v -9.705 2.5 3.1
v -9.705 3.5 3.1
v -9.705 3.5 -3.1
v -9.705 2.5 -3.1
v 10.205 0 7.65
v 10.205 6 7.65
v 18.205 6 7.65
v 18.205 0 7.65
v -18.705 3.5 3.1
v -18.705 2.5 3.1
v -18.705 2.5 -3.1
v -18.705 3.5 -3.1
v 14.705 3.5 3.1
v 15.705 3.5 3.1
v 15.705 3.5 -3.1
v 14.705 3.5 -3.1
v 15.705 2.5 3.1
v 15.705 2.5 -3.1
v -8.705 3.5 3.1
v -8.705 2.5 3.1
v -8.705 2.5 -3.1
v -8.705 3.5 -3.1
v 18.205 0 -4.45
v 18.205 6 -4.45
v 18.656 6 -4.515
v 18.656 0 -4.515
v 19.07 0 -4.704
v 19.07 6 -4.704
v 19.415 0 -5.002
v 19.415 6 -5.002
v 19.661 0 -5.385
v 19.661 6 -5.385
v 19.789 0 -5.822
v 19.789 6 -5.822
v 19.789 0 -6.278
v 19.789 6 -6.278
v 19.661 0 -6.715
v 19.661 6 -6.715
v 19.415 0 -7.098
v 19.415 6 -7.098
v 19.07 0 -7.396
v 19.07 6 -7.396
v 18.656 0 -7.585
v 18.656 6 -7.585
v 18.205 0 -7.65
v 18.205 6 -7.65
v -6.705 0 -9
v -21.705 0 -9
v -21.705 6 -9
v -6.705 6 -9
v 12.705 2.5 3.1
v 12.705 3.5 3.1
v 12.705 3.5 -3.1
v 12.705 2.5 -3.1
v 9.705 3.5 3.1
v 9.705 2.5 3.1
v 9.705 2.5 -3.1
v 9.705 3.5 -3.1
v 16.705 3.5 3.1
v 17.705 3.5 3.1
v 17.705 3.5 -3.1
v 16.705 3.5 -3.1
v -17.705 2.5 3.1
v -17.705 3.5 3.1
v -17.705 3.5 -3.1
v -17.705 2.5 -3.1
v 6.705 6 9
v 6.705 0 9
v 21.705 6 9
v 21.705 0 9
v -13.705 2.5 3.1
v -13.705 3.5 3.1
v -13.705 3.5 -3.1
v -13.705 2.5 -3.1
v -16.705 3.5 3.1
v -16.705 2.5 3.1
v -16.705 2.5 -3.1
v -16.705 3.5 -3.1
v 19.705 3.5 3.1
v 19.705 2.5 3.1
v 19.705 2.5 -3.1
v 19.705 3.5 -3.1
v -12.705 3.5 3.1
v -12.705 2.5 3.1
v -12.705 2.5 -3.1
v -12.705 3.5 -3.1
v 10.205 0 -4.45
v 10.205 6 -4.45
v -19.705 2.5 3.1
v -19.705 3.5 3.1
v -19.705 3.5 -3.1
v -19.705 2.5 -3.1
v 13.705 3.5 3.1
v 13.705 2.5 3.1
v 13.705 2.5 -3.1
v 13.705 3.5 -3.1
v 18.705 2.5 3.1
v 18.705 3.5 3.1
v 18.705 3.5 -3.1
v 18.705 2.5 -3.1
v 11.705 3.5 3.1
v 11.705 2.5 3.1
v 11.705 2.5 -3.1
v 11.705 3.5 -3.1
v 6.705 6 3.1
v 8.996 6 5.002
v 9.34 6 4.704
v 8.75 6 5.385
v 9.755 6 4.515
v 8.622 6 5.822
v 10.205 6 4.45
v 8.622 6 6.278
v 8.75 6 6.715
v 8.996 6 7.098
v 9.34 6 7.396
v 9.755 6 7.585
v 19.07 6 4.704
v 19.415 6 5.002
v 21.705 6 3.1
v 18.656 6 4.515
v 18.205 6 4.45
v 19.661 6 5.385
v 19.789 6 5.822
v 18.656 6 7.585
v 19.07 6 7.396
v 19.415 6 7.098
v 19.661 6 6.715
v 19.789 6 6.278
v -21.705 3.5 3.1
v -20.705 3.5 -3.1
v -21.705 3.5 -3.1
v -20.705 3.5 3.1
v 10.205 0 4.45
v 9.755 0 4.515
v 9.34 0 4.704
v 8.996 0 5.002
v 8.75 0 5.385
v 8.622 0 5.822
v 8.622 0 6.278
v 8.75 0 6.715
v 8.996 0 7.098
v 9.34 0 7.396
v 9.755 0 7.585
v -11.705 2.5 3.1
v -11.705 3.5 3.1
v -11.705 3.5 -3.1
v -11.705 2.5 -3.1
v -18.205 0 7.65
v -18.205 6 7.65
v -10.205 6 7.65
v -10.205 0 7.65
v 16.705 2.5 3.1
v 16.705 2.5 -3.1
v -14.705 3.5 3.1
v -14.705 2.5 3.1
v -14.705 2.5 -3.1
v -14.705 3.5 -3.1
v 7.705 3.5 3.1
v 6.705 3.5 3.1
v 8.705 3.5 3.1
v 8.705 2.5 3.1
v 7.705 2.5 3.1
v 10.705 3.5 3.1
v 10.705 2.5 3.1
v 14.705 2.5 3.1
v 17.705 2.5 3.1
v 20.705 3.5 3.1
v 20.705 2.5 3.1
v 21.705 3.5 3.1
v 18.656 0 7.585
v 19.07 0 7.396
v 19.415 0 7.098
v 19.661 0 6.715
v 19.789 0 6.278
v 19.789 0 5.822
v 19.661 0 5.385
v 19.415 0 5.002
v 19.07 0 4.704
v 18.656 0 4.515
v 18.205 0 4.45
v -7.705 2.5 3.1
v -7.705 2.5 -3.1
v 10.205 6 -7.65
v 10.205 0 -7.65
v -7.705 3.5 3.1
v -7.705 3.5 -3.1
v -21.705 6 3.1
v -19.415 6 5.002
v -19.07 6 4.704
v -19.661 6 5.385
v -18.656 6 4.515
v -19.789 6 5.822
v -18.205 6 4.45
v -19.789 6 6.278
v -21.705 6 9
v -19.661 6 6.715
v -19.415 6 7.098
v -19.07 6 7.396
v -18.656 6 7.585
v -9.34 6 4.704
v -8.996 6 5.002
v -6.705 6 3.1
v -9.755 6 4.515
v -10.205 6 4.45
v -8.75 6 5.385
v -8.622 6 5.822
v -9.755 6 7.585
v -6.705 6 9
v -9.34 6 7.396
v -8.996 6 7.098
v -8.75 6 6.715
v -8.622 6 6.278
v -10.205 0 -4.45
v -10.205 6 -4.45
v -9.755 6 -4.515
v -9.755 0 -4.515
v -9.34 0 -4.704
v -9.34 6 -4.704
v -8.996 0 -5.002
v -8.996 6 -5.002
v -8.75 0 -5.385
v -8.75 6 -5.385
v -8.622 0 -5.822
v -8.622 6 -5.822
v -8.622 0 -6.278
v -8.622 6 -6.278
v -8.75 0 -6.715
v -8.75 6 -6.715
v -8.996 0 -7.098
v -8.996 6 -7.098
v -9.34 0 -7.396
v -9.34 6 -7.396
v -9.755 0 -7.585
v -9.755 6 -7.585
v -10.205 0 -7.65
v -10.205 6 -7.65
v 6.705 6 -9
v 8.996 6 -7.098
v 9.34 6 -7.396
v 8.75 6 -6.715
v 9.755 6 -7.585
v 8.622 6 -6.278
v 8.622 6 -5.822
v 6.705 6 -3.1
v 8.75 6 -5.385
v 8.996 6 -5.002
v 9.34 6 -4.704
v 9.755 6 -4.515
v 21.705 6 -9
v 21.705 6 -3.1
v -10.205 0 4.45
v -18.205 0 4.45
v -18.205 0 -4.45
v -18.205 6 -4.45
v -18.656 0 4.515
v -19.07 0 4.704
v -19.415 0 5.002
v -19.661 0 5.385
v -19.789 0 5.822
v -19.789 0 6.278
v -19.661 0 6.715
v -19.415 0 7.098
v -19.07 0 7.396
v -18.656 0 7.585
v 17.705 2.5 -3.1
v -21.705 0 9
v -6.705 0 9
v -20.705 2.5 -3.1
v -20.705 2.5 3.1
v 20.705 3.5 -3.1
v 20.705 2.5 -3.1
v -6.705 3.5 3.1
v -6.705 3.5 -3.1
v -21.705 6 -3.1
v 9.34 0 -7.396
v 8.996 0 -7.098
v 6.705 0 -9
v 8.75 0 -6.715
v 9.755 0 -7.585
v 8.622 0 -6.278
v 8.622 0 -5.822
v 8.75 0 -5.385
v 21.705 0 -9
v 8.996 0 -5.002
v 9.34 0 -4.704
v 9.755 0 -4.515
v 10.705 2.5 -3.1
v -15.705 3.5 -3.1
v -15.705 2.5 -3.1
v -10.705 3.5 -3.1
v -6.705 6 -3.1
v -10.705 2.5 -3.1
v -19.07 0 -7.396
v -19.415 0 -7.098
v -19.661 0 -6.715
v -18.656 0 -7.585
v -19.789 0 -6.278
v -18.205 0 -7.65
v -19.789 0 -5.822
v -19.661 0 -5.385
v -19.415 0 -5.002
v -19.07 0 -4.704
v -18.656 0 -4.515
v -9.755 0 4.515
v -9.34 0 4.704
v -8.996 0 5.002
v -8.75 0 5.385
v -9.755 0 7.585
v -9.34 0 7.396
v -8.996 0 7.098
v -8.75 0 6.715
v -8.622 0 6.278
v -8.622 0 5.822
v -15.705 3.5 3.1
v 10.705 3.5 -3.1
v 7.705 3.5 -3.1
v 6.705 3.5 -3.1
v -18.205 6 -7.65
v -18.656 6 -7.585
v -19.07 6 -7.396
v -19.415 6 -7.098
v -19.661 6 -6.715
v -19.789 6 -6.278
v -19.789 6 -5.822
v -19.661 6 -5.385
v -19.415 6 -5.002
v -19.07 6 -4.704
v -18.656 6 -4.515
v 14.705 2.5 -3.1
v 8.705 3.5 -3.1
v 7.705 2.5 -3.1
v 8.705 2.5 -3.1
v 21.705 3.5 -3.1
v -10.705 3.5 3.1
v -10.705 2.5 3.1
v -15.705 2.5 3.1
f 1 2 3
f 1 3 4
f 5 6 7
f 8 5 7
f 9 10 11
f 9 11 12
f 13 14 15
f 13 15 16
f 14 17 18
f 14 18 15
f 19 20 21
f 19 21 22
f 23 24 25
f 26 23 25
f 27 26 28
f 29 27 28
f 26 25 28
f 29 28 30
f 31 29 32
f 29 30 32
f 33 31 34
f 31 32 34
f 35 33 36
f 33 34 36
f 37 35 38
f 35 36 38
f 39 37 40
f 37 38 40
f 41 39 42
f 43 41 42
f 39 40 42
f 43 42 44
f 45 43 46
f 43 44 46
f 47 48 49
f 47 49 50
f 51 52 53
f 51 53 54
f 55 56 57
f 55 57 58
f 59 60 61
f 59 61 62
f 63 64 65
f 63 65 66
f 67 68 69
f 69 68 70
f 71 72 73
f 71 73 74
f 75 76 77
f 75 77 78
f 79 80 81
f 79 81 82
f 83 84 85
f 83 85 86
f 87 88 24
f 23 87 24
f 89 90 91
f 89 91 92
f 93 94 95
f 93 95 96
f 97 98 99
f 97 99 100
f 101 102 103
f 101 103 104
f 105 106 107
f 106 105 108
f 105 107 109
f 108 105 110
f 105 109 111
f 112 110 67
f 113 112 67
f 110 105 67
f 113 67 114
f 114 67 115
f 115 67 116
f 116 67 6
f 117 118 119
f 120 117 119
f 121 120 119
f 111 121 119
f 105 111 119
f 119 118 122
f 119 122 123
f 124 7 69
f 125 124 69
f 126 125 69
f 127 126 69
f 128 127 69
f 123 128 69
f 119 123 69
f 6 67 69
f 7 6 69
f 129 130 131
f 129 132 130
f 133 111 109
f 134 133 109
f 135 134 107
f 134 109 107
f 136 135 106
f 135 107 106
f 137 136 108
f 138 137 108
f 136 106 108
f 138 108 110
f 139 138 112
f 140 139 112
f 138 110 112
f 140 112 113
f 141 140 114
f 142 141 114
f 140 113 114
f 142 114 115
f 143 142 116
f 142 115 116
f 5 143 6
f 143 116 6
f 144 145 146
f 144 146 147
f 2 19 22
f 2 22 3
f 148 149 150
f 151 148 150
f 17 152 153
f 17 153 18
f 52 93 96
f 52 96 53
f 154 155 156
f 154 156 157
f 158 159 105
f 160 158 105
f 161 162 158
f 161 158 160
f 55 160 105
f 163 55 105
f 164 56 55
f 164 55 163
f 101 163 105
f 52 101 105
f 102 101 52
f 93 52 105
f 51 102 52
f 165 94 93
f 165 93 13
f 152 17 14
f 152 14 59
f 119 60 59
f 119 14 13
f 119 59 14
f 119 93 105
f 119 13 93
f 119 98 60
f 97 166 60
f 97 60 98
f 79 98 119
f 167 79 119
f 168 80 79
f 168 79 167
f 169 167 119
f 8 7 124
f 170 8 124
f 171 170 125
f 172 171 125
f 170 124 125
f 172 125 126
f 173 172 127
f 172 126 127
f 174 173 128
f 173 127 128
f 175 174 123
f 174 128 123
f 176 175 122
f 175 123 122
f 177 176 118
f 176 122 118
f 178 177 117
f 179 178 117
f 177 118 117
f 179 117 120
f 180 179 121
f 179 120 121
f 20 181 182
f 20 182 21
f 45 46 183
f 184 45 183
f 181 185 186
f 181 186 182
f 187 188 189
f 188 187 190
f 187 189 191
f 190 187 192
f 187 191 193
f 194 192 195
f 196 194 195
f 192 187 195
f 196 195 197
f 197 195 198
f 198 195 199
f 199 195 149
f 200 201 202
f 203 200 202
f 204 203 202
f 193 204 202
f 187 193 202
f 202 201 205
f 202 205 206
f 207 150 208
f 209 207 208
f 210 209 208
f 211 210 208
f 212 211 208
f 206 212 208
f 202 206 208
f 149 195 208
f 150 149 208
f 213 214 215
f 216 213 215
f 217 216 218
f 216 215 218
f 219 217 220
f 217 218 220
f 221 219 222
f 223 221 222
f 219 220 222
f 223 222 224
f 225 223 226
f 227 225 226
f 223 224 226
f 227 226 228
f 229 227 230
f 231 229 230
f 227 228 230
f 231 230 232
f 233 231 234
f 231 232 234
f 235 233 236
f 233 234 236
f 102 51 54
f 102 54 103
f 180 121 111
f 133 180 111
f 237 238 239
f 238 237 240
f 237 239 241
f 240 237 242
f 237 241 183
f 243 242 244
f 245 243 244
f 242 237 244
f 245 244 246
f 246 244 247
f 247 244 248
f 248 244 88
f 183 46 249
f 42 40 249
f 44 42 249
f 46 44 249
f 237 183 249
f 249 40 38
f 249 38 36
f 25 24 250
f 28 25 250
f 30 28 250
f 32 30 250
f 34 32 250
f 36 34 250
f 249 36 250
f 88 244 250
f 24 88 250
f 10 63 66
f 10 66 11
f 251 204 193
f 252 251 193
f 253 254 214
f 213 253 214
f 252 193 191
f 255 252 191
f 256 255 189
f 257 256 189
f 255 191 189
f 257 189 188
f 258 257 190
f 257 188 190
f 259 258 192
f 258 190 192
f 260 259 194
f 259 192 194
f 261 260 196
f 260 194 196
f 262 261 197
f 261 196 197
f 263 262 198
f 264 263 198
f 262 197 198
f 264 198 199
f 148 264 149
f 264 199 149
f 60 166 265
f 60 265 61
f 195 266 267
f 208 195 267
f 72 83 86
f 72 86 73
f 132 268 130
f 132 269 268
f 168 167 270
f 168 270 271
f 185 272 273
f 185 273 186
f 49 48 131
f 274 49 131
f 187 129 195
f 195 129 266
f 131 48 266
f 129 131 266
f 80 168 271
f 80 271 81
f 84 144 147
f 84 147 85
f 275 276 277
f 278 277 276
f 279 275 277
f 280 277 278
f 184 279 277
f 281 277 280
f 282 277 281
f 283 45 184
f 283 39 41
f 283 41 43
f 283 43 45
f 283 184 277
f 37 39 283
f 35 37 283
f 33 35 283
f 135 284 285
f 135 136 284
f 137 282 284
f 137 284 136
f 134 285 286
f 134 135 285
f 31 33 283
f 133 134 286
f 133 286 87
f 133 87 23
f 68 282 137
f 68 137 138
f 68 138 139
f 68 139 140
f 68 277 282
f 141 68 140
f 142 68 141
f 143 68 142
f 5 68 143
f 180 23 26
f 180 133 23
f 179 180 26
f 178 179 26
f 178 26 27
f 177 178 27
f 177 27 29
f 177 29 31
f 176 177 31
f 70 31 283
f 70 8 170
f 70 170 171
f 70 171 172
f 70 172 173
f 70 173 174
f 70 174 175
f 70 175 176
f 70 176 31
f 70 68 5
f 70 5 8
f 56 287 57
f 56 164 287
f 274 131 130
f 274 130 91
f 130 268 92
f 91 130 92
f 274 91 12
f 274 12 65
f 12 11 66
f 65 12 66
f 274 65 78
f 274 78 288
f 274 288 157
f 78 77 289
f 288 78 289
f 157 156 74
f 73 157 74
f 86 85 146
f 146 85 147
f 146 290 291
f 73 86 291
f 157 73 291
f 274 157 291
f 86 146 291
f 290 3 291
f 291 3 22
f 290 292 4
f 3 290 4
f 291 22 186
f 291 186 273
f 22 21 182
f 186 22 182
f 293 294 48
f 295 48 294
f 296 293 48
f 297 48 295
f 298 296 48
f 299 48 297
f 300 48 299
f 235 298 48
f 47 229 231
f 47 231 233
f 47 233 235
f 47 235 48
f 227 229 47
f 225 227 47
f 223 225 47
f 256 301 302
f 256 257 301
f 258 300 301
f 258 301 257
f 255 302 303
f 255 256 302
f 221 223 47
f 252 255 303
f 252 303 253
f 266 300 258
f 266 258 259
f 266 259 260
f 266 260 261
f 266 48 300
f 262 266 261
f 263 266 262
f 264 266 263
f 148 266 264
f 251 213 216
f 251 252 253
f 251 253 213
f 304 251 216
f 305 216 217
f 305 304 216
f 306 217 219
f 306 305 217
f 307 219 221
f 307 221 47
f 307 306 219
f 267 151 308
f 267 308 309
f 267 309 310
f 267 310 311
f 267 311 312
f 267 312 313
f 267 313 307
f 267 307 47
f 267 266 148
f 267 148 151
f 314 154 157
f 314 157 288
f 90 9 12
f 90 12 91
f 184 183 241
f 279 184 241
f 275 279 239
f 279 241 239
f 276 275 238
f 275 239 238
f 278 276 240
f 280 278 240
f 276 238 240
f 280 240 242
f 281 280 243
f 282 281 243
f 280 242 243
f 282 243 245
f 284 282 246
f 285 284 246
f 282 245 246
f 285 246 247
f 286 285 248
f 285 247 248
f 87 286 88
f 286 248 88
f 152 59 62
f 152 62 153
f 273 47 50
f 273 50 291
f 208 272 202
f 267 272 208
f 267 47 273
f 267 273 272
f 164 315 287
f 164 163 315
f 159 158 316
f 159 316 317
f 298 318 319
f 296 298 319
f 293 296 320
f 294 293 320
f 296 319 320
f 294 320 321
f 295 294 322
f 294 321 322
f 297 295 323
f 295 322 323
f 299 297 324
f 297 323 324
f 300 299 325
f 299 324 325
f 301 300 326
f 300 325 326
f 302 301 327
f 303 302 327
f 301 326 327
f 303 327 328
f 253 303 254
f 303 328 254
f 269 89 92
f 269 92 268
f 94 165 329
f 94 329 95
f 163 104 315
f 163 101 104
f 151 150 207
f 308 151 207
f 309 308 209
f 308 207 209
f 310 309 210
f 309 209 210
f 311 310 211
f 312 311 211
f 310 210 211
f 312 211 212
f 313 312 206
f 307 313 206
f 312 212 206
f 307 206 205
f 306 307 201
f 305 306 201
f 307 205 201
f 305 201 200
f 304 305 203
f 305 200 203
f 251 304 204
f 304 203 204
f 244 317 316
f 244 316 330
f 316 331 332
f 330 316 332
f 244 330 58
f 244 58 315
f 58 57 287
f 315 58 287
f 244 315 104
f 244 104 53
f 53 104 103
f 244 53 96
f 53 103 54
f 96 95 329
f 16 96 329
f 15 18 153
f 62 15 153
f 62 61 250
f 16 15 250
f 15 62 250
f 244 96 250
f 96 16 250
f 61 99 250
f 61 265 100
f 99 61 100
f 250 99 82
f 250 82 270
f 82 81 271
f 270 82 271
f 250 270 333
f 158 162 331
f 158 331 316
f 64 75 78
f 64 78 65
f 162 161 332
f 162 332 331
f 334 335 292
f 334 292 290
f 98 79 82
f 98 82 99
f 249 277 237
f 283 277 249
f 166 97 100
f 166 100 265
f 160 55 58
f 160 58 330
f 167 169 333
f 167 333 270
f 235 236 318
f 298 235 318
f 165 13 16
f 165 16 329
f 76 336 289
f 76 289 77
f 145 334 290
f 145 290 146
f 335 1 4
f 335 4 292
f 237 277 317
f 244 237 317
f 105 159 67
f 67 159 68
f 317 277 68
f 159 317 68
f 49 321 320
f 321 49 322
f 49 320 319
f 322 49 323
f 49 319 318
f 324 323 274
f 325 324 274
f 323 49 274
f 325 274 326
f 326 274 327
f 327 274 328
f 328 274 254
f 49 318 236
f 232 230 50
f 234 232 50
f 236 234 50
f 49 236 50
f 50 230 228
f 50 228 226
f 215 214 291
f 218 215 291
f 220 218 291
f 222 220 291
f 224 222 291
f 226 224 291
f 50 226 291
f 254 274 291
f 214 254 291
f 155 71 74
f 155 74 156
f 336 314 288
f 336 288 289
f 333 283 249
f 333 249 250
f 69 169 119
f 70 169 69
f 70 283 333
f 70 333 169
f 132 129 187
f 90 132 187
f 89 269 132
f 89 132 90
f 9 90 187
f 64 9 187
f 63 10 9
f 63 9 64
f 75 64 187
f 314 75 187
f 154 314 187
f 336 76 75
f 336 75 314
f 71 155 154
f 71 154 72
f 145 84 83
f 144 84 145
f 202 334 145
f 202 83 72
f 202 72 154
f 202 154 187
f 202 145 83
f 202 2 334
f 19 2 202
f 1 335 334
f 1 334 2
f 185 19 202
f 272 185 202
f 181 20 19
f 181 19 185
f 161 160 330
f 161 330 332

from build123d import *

# Parameters (mm, degrees)
F1_DEPTH      = 3.1
F1_DEPTH_BACK = 3.1
F2_DEPTH      = 3.1
F2_DEPTH_BACK = 3.1
F3_W          = 15
F3_H          = 5.9
F4_DEPTH      = 6
F5_DEPTH      = 6
F7_DEPTH      = 6
F8_DEPTH      = 6


with BuildPart() as f1:
    # F0 (on Top) → F1 (new body, two sides)
    with BuildSketch(Plane.XY) as f1_sk:
        Polygon((-21.705397, 3.5), (-21.705397, 0), (-6.705397, 0), (-6.705397, 2.5), (-6.705397, 3.5), (-7.705397, 3.5), (-7.705397, 2.5), (-8.705397, 2.5), (-8.705397, 3.5), (-9.705397, 3.5), (-9.705397, 2.5), (-10.705397, 2.5), (-10.705397, 3.5), (-11.705397, 3.5), (-11.705397, 2.5), (-12.705397, 2.5), (-12.705397, 3.5), (-13.705397, 3.5), (-13.705397, 2.5), (-14.705397, 2.5), (-14.705397, 3.5), (-15.705397, 3.5), (-15.705397, 2.5), (-16.705397, 2.5), (-16.705397, 3.5), (-17.705397, 3.5), (-17.705397, 2.5), (-18.705397, 2.5), (-18.705397, 3.5), (-19.705397, 3.5), (-19.705397, 2.5), (-20.705397, 2.5), (-20.705397, 3.5), align=None)
    extrude(amount=F1_DEPTH)
    extrude(f1_sk.sketch, amount=-F1_DEPTH_BACK)

    # F3 (on face) → F5 (join)
    with BuildSketch(Plane.XZ):
        with Locations((-14.205397, -6.05)):
            Rectangle(F3_W, F3_H)
        with Locations((-14.205397, 6.05)):
            Rectangle(F3_W, F3_H)
    extrude(amount=-F5_DEPTH)

    # F6 (on face) → F7 (cut, through all)
    with BuildSketch(Plane(origin=(0, 6, 0), x_dir=(-1, 0, 0), z_dir=(0, 1, 0))):
        with BuildLine():
            Line((10.205397, -7.65), (18.205397, -7.65))
            ThreePointArc((18.205397, -7.65), (19.805397, -6.05), (18.205397, -4.45))
            Line((18.205397, -4.45), (10.205397, -4.45))
            ThreePointArc((10.205397, -4.45), (8.605397, -6.05), (10.205397, -7.65))
        make_face()
        with BuildLine():
            Line((10.205397, 4.45), (18.205397, 4.45))
            ThreePointArc((18.205397, 4.45), (19.805397, 6.05), (18.205397, 7.65))
            Line((18.205397, 7.65), (10.205397, 7.65))
            ThreePointArc((10.205397, 7.65), (8.605397, 6.05), (10.205397, 4.45))
        make_face()
    extrude(amount=-F7_DEPTH, mode=Mode.SUBTRACT)


with BuildPart() as f2:
    # F0 (on Top) → F2 (new body, two sides)
    with BuildSketch(Plane.XY) as f2_sk:
        Polygon((10.705397, 2.5), (9.705397, 2.5), (9.705397, 3.5), (8.705397, 3.5), (8.705397, 2.5), (7.705397, 2.5), (7.705397, 3.5), (6.705397, 3.5), (6.705397, 2.5), (6.705397, 0), (21.705397, 0), (21.705397, 3.5), (20.705397, 3.5), (20.705397, 2.5), (19.705397, 2.5), (19.705397, 3.5), (18.705397, 3.5), (18.705397, 2.5), (17.705397, 2.5), (17.705397, 3.5), (16.705397, 3.5), (16.705397, 2.5), (15.705397, 2.5), (15.705397, 3.5), (14.705397, 3.5), (14.705397, 2.5), (13.705397, 2.5), (13.705397, 3.5), (12.705397, 3.5), (12.705397, 2.5), (11.705397, 2.5), (11.705397, 3.5), (10.705397, 3.5), align=None)
    extrude(amount=F2_DEPTH)
    extrude(f2_sk.sketch, amount=-F2_DEPTH_BACK)

    # F3 (on face) → F4 (join)
    with BuildSketch(Plane.XZ):
        with Locations((14.205397, -6.05)):
            Rectangle(F3_W, F3_H)
        with Locations((14.205397, 6.05)):
            Rectangle(F3_W, F3_H)
    extrude(amount=-F4_DEPTH)

    # F6 (on face) → F8 (cut, through all)
    with BuildSketch(Plane(origin=(0, 6, 0), x_dir=(-1, 0, 0), z_dir=(0, 1, 0))):
        with BuildLine():
            ThreePointArc((-10.205397, -7.65), (-8.605397, -6.05), (-10.205397, -4.45))
            Line((-10.205397, -4.45), (-18.205397, -4.45))
            ThreePointArc((-18.205397, -4.45), (-19.805397, -6.05), (-18.205397, -7.65))
            Line((-18.205397, -7.65), (-10.205397, -7.65))
        make_face()
        with BuildLine():
            ThreePointArc((-18.205397, 7.65), (-19.805397, 6.05), (-18.205397, 4.45))
            Line((-18.205397, 4.45), (-10.205397, 4.45))
            ThreePointArc((-10.205397, 4.45), (-8.605397, 6.05), (-10.205397, 7.65))
            Line((-10.205397, 7.65), (-18.205397, 7.65))
        make_face()
    extrude(amount=-F8_DEPTH, mode=Mode.SUBTRACT)


solid = Compound([f1.part, f2.part])
